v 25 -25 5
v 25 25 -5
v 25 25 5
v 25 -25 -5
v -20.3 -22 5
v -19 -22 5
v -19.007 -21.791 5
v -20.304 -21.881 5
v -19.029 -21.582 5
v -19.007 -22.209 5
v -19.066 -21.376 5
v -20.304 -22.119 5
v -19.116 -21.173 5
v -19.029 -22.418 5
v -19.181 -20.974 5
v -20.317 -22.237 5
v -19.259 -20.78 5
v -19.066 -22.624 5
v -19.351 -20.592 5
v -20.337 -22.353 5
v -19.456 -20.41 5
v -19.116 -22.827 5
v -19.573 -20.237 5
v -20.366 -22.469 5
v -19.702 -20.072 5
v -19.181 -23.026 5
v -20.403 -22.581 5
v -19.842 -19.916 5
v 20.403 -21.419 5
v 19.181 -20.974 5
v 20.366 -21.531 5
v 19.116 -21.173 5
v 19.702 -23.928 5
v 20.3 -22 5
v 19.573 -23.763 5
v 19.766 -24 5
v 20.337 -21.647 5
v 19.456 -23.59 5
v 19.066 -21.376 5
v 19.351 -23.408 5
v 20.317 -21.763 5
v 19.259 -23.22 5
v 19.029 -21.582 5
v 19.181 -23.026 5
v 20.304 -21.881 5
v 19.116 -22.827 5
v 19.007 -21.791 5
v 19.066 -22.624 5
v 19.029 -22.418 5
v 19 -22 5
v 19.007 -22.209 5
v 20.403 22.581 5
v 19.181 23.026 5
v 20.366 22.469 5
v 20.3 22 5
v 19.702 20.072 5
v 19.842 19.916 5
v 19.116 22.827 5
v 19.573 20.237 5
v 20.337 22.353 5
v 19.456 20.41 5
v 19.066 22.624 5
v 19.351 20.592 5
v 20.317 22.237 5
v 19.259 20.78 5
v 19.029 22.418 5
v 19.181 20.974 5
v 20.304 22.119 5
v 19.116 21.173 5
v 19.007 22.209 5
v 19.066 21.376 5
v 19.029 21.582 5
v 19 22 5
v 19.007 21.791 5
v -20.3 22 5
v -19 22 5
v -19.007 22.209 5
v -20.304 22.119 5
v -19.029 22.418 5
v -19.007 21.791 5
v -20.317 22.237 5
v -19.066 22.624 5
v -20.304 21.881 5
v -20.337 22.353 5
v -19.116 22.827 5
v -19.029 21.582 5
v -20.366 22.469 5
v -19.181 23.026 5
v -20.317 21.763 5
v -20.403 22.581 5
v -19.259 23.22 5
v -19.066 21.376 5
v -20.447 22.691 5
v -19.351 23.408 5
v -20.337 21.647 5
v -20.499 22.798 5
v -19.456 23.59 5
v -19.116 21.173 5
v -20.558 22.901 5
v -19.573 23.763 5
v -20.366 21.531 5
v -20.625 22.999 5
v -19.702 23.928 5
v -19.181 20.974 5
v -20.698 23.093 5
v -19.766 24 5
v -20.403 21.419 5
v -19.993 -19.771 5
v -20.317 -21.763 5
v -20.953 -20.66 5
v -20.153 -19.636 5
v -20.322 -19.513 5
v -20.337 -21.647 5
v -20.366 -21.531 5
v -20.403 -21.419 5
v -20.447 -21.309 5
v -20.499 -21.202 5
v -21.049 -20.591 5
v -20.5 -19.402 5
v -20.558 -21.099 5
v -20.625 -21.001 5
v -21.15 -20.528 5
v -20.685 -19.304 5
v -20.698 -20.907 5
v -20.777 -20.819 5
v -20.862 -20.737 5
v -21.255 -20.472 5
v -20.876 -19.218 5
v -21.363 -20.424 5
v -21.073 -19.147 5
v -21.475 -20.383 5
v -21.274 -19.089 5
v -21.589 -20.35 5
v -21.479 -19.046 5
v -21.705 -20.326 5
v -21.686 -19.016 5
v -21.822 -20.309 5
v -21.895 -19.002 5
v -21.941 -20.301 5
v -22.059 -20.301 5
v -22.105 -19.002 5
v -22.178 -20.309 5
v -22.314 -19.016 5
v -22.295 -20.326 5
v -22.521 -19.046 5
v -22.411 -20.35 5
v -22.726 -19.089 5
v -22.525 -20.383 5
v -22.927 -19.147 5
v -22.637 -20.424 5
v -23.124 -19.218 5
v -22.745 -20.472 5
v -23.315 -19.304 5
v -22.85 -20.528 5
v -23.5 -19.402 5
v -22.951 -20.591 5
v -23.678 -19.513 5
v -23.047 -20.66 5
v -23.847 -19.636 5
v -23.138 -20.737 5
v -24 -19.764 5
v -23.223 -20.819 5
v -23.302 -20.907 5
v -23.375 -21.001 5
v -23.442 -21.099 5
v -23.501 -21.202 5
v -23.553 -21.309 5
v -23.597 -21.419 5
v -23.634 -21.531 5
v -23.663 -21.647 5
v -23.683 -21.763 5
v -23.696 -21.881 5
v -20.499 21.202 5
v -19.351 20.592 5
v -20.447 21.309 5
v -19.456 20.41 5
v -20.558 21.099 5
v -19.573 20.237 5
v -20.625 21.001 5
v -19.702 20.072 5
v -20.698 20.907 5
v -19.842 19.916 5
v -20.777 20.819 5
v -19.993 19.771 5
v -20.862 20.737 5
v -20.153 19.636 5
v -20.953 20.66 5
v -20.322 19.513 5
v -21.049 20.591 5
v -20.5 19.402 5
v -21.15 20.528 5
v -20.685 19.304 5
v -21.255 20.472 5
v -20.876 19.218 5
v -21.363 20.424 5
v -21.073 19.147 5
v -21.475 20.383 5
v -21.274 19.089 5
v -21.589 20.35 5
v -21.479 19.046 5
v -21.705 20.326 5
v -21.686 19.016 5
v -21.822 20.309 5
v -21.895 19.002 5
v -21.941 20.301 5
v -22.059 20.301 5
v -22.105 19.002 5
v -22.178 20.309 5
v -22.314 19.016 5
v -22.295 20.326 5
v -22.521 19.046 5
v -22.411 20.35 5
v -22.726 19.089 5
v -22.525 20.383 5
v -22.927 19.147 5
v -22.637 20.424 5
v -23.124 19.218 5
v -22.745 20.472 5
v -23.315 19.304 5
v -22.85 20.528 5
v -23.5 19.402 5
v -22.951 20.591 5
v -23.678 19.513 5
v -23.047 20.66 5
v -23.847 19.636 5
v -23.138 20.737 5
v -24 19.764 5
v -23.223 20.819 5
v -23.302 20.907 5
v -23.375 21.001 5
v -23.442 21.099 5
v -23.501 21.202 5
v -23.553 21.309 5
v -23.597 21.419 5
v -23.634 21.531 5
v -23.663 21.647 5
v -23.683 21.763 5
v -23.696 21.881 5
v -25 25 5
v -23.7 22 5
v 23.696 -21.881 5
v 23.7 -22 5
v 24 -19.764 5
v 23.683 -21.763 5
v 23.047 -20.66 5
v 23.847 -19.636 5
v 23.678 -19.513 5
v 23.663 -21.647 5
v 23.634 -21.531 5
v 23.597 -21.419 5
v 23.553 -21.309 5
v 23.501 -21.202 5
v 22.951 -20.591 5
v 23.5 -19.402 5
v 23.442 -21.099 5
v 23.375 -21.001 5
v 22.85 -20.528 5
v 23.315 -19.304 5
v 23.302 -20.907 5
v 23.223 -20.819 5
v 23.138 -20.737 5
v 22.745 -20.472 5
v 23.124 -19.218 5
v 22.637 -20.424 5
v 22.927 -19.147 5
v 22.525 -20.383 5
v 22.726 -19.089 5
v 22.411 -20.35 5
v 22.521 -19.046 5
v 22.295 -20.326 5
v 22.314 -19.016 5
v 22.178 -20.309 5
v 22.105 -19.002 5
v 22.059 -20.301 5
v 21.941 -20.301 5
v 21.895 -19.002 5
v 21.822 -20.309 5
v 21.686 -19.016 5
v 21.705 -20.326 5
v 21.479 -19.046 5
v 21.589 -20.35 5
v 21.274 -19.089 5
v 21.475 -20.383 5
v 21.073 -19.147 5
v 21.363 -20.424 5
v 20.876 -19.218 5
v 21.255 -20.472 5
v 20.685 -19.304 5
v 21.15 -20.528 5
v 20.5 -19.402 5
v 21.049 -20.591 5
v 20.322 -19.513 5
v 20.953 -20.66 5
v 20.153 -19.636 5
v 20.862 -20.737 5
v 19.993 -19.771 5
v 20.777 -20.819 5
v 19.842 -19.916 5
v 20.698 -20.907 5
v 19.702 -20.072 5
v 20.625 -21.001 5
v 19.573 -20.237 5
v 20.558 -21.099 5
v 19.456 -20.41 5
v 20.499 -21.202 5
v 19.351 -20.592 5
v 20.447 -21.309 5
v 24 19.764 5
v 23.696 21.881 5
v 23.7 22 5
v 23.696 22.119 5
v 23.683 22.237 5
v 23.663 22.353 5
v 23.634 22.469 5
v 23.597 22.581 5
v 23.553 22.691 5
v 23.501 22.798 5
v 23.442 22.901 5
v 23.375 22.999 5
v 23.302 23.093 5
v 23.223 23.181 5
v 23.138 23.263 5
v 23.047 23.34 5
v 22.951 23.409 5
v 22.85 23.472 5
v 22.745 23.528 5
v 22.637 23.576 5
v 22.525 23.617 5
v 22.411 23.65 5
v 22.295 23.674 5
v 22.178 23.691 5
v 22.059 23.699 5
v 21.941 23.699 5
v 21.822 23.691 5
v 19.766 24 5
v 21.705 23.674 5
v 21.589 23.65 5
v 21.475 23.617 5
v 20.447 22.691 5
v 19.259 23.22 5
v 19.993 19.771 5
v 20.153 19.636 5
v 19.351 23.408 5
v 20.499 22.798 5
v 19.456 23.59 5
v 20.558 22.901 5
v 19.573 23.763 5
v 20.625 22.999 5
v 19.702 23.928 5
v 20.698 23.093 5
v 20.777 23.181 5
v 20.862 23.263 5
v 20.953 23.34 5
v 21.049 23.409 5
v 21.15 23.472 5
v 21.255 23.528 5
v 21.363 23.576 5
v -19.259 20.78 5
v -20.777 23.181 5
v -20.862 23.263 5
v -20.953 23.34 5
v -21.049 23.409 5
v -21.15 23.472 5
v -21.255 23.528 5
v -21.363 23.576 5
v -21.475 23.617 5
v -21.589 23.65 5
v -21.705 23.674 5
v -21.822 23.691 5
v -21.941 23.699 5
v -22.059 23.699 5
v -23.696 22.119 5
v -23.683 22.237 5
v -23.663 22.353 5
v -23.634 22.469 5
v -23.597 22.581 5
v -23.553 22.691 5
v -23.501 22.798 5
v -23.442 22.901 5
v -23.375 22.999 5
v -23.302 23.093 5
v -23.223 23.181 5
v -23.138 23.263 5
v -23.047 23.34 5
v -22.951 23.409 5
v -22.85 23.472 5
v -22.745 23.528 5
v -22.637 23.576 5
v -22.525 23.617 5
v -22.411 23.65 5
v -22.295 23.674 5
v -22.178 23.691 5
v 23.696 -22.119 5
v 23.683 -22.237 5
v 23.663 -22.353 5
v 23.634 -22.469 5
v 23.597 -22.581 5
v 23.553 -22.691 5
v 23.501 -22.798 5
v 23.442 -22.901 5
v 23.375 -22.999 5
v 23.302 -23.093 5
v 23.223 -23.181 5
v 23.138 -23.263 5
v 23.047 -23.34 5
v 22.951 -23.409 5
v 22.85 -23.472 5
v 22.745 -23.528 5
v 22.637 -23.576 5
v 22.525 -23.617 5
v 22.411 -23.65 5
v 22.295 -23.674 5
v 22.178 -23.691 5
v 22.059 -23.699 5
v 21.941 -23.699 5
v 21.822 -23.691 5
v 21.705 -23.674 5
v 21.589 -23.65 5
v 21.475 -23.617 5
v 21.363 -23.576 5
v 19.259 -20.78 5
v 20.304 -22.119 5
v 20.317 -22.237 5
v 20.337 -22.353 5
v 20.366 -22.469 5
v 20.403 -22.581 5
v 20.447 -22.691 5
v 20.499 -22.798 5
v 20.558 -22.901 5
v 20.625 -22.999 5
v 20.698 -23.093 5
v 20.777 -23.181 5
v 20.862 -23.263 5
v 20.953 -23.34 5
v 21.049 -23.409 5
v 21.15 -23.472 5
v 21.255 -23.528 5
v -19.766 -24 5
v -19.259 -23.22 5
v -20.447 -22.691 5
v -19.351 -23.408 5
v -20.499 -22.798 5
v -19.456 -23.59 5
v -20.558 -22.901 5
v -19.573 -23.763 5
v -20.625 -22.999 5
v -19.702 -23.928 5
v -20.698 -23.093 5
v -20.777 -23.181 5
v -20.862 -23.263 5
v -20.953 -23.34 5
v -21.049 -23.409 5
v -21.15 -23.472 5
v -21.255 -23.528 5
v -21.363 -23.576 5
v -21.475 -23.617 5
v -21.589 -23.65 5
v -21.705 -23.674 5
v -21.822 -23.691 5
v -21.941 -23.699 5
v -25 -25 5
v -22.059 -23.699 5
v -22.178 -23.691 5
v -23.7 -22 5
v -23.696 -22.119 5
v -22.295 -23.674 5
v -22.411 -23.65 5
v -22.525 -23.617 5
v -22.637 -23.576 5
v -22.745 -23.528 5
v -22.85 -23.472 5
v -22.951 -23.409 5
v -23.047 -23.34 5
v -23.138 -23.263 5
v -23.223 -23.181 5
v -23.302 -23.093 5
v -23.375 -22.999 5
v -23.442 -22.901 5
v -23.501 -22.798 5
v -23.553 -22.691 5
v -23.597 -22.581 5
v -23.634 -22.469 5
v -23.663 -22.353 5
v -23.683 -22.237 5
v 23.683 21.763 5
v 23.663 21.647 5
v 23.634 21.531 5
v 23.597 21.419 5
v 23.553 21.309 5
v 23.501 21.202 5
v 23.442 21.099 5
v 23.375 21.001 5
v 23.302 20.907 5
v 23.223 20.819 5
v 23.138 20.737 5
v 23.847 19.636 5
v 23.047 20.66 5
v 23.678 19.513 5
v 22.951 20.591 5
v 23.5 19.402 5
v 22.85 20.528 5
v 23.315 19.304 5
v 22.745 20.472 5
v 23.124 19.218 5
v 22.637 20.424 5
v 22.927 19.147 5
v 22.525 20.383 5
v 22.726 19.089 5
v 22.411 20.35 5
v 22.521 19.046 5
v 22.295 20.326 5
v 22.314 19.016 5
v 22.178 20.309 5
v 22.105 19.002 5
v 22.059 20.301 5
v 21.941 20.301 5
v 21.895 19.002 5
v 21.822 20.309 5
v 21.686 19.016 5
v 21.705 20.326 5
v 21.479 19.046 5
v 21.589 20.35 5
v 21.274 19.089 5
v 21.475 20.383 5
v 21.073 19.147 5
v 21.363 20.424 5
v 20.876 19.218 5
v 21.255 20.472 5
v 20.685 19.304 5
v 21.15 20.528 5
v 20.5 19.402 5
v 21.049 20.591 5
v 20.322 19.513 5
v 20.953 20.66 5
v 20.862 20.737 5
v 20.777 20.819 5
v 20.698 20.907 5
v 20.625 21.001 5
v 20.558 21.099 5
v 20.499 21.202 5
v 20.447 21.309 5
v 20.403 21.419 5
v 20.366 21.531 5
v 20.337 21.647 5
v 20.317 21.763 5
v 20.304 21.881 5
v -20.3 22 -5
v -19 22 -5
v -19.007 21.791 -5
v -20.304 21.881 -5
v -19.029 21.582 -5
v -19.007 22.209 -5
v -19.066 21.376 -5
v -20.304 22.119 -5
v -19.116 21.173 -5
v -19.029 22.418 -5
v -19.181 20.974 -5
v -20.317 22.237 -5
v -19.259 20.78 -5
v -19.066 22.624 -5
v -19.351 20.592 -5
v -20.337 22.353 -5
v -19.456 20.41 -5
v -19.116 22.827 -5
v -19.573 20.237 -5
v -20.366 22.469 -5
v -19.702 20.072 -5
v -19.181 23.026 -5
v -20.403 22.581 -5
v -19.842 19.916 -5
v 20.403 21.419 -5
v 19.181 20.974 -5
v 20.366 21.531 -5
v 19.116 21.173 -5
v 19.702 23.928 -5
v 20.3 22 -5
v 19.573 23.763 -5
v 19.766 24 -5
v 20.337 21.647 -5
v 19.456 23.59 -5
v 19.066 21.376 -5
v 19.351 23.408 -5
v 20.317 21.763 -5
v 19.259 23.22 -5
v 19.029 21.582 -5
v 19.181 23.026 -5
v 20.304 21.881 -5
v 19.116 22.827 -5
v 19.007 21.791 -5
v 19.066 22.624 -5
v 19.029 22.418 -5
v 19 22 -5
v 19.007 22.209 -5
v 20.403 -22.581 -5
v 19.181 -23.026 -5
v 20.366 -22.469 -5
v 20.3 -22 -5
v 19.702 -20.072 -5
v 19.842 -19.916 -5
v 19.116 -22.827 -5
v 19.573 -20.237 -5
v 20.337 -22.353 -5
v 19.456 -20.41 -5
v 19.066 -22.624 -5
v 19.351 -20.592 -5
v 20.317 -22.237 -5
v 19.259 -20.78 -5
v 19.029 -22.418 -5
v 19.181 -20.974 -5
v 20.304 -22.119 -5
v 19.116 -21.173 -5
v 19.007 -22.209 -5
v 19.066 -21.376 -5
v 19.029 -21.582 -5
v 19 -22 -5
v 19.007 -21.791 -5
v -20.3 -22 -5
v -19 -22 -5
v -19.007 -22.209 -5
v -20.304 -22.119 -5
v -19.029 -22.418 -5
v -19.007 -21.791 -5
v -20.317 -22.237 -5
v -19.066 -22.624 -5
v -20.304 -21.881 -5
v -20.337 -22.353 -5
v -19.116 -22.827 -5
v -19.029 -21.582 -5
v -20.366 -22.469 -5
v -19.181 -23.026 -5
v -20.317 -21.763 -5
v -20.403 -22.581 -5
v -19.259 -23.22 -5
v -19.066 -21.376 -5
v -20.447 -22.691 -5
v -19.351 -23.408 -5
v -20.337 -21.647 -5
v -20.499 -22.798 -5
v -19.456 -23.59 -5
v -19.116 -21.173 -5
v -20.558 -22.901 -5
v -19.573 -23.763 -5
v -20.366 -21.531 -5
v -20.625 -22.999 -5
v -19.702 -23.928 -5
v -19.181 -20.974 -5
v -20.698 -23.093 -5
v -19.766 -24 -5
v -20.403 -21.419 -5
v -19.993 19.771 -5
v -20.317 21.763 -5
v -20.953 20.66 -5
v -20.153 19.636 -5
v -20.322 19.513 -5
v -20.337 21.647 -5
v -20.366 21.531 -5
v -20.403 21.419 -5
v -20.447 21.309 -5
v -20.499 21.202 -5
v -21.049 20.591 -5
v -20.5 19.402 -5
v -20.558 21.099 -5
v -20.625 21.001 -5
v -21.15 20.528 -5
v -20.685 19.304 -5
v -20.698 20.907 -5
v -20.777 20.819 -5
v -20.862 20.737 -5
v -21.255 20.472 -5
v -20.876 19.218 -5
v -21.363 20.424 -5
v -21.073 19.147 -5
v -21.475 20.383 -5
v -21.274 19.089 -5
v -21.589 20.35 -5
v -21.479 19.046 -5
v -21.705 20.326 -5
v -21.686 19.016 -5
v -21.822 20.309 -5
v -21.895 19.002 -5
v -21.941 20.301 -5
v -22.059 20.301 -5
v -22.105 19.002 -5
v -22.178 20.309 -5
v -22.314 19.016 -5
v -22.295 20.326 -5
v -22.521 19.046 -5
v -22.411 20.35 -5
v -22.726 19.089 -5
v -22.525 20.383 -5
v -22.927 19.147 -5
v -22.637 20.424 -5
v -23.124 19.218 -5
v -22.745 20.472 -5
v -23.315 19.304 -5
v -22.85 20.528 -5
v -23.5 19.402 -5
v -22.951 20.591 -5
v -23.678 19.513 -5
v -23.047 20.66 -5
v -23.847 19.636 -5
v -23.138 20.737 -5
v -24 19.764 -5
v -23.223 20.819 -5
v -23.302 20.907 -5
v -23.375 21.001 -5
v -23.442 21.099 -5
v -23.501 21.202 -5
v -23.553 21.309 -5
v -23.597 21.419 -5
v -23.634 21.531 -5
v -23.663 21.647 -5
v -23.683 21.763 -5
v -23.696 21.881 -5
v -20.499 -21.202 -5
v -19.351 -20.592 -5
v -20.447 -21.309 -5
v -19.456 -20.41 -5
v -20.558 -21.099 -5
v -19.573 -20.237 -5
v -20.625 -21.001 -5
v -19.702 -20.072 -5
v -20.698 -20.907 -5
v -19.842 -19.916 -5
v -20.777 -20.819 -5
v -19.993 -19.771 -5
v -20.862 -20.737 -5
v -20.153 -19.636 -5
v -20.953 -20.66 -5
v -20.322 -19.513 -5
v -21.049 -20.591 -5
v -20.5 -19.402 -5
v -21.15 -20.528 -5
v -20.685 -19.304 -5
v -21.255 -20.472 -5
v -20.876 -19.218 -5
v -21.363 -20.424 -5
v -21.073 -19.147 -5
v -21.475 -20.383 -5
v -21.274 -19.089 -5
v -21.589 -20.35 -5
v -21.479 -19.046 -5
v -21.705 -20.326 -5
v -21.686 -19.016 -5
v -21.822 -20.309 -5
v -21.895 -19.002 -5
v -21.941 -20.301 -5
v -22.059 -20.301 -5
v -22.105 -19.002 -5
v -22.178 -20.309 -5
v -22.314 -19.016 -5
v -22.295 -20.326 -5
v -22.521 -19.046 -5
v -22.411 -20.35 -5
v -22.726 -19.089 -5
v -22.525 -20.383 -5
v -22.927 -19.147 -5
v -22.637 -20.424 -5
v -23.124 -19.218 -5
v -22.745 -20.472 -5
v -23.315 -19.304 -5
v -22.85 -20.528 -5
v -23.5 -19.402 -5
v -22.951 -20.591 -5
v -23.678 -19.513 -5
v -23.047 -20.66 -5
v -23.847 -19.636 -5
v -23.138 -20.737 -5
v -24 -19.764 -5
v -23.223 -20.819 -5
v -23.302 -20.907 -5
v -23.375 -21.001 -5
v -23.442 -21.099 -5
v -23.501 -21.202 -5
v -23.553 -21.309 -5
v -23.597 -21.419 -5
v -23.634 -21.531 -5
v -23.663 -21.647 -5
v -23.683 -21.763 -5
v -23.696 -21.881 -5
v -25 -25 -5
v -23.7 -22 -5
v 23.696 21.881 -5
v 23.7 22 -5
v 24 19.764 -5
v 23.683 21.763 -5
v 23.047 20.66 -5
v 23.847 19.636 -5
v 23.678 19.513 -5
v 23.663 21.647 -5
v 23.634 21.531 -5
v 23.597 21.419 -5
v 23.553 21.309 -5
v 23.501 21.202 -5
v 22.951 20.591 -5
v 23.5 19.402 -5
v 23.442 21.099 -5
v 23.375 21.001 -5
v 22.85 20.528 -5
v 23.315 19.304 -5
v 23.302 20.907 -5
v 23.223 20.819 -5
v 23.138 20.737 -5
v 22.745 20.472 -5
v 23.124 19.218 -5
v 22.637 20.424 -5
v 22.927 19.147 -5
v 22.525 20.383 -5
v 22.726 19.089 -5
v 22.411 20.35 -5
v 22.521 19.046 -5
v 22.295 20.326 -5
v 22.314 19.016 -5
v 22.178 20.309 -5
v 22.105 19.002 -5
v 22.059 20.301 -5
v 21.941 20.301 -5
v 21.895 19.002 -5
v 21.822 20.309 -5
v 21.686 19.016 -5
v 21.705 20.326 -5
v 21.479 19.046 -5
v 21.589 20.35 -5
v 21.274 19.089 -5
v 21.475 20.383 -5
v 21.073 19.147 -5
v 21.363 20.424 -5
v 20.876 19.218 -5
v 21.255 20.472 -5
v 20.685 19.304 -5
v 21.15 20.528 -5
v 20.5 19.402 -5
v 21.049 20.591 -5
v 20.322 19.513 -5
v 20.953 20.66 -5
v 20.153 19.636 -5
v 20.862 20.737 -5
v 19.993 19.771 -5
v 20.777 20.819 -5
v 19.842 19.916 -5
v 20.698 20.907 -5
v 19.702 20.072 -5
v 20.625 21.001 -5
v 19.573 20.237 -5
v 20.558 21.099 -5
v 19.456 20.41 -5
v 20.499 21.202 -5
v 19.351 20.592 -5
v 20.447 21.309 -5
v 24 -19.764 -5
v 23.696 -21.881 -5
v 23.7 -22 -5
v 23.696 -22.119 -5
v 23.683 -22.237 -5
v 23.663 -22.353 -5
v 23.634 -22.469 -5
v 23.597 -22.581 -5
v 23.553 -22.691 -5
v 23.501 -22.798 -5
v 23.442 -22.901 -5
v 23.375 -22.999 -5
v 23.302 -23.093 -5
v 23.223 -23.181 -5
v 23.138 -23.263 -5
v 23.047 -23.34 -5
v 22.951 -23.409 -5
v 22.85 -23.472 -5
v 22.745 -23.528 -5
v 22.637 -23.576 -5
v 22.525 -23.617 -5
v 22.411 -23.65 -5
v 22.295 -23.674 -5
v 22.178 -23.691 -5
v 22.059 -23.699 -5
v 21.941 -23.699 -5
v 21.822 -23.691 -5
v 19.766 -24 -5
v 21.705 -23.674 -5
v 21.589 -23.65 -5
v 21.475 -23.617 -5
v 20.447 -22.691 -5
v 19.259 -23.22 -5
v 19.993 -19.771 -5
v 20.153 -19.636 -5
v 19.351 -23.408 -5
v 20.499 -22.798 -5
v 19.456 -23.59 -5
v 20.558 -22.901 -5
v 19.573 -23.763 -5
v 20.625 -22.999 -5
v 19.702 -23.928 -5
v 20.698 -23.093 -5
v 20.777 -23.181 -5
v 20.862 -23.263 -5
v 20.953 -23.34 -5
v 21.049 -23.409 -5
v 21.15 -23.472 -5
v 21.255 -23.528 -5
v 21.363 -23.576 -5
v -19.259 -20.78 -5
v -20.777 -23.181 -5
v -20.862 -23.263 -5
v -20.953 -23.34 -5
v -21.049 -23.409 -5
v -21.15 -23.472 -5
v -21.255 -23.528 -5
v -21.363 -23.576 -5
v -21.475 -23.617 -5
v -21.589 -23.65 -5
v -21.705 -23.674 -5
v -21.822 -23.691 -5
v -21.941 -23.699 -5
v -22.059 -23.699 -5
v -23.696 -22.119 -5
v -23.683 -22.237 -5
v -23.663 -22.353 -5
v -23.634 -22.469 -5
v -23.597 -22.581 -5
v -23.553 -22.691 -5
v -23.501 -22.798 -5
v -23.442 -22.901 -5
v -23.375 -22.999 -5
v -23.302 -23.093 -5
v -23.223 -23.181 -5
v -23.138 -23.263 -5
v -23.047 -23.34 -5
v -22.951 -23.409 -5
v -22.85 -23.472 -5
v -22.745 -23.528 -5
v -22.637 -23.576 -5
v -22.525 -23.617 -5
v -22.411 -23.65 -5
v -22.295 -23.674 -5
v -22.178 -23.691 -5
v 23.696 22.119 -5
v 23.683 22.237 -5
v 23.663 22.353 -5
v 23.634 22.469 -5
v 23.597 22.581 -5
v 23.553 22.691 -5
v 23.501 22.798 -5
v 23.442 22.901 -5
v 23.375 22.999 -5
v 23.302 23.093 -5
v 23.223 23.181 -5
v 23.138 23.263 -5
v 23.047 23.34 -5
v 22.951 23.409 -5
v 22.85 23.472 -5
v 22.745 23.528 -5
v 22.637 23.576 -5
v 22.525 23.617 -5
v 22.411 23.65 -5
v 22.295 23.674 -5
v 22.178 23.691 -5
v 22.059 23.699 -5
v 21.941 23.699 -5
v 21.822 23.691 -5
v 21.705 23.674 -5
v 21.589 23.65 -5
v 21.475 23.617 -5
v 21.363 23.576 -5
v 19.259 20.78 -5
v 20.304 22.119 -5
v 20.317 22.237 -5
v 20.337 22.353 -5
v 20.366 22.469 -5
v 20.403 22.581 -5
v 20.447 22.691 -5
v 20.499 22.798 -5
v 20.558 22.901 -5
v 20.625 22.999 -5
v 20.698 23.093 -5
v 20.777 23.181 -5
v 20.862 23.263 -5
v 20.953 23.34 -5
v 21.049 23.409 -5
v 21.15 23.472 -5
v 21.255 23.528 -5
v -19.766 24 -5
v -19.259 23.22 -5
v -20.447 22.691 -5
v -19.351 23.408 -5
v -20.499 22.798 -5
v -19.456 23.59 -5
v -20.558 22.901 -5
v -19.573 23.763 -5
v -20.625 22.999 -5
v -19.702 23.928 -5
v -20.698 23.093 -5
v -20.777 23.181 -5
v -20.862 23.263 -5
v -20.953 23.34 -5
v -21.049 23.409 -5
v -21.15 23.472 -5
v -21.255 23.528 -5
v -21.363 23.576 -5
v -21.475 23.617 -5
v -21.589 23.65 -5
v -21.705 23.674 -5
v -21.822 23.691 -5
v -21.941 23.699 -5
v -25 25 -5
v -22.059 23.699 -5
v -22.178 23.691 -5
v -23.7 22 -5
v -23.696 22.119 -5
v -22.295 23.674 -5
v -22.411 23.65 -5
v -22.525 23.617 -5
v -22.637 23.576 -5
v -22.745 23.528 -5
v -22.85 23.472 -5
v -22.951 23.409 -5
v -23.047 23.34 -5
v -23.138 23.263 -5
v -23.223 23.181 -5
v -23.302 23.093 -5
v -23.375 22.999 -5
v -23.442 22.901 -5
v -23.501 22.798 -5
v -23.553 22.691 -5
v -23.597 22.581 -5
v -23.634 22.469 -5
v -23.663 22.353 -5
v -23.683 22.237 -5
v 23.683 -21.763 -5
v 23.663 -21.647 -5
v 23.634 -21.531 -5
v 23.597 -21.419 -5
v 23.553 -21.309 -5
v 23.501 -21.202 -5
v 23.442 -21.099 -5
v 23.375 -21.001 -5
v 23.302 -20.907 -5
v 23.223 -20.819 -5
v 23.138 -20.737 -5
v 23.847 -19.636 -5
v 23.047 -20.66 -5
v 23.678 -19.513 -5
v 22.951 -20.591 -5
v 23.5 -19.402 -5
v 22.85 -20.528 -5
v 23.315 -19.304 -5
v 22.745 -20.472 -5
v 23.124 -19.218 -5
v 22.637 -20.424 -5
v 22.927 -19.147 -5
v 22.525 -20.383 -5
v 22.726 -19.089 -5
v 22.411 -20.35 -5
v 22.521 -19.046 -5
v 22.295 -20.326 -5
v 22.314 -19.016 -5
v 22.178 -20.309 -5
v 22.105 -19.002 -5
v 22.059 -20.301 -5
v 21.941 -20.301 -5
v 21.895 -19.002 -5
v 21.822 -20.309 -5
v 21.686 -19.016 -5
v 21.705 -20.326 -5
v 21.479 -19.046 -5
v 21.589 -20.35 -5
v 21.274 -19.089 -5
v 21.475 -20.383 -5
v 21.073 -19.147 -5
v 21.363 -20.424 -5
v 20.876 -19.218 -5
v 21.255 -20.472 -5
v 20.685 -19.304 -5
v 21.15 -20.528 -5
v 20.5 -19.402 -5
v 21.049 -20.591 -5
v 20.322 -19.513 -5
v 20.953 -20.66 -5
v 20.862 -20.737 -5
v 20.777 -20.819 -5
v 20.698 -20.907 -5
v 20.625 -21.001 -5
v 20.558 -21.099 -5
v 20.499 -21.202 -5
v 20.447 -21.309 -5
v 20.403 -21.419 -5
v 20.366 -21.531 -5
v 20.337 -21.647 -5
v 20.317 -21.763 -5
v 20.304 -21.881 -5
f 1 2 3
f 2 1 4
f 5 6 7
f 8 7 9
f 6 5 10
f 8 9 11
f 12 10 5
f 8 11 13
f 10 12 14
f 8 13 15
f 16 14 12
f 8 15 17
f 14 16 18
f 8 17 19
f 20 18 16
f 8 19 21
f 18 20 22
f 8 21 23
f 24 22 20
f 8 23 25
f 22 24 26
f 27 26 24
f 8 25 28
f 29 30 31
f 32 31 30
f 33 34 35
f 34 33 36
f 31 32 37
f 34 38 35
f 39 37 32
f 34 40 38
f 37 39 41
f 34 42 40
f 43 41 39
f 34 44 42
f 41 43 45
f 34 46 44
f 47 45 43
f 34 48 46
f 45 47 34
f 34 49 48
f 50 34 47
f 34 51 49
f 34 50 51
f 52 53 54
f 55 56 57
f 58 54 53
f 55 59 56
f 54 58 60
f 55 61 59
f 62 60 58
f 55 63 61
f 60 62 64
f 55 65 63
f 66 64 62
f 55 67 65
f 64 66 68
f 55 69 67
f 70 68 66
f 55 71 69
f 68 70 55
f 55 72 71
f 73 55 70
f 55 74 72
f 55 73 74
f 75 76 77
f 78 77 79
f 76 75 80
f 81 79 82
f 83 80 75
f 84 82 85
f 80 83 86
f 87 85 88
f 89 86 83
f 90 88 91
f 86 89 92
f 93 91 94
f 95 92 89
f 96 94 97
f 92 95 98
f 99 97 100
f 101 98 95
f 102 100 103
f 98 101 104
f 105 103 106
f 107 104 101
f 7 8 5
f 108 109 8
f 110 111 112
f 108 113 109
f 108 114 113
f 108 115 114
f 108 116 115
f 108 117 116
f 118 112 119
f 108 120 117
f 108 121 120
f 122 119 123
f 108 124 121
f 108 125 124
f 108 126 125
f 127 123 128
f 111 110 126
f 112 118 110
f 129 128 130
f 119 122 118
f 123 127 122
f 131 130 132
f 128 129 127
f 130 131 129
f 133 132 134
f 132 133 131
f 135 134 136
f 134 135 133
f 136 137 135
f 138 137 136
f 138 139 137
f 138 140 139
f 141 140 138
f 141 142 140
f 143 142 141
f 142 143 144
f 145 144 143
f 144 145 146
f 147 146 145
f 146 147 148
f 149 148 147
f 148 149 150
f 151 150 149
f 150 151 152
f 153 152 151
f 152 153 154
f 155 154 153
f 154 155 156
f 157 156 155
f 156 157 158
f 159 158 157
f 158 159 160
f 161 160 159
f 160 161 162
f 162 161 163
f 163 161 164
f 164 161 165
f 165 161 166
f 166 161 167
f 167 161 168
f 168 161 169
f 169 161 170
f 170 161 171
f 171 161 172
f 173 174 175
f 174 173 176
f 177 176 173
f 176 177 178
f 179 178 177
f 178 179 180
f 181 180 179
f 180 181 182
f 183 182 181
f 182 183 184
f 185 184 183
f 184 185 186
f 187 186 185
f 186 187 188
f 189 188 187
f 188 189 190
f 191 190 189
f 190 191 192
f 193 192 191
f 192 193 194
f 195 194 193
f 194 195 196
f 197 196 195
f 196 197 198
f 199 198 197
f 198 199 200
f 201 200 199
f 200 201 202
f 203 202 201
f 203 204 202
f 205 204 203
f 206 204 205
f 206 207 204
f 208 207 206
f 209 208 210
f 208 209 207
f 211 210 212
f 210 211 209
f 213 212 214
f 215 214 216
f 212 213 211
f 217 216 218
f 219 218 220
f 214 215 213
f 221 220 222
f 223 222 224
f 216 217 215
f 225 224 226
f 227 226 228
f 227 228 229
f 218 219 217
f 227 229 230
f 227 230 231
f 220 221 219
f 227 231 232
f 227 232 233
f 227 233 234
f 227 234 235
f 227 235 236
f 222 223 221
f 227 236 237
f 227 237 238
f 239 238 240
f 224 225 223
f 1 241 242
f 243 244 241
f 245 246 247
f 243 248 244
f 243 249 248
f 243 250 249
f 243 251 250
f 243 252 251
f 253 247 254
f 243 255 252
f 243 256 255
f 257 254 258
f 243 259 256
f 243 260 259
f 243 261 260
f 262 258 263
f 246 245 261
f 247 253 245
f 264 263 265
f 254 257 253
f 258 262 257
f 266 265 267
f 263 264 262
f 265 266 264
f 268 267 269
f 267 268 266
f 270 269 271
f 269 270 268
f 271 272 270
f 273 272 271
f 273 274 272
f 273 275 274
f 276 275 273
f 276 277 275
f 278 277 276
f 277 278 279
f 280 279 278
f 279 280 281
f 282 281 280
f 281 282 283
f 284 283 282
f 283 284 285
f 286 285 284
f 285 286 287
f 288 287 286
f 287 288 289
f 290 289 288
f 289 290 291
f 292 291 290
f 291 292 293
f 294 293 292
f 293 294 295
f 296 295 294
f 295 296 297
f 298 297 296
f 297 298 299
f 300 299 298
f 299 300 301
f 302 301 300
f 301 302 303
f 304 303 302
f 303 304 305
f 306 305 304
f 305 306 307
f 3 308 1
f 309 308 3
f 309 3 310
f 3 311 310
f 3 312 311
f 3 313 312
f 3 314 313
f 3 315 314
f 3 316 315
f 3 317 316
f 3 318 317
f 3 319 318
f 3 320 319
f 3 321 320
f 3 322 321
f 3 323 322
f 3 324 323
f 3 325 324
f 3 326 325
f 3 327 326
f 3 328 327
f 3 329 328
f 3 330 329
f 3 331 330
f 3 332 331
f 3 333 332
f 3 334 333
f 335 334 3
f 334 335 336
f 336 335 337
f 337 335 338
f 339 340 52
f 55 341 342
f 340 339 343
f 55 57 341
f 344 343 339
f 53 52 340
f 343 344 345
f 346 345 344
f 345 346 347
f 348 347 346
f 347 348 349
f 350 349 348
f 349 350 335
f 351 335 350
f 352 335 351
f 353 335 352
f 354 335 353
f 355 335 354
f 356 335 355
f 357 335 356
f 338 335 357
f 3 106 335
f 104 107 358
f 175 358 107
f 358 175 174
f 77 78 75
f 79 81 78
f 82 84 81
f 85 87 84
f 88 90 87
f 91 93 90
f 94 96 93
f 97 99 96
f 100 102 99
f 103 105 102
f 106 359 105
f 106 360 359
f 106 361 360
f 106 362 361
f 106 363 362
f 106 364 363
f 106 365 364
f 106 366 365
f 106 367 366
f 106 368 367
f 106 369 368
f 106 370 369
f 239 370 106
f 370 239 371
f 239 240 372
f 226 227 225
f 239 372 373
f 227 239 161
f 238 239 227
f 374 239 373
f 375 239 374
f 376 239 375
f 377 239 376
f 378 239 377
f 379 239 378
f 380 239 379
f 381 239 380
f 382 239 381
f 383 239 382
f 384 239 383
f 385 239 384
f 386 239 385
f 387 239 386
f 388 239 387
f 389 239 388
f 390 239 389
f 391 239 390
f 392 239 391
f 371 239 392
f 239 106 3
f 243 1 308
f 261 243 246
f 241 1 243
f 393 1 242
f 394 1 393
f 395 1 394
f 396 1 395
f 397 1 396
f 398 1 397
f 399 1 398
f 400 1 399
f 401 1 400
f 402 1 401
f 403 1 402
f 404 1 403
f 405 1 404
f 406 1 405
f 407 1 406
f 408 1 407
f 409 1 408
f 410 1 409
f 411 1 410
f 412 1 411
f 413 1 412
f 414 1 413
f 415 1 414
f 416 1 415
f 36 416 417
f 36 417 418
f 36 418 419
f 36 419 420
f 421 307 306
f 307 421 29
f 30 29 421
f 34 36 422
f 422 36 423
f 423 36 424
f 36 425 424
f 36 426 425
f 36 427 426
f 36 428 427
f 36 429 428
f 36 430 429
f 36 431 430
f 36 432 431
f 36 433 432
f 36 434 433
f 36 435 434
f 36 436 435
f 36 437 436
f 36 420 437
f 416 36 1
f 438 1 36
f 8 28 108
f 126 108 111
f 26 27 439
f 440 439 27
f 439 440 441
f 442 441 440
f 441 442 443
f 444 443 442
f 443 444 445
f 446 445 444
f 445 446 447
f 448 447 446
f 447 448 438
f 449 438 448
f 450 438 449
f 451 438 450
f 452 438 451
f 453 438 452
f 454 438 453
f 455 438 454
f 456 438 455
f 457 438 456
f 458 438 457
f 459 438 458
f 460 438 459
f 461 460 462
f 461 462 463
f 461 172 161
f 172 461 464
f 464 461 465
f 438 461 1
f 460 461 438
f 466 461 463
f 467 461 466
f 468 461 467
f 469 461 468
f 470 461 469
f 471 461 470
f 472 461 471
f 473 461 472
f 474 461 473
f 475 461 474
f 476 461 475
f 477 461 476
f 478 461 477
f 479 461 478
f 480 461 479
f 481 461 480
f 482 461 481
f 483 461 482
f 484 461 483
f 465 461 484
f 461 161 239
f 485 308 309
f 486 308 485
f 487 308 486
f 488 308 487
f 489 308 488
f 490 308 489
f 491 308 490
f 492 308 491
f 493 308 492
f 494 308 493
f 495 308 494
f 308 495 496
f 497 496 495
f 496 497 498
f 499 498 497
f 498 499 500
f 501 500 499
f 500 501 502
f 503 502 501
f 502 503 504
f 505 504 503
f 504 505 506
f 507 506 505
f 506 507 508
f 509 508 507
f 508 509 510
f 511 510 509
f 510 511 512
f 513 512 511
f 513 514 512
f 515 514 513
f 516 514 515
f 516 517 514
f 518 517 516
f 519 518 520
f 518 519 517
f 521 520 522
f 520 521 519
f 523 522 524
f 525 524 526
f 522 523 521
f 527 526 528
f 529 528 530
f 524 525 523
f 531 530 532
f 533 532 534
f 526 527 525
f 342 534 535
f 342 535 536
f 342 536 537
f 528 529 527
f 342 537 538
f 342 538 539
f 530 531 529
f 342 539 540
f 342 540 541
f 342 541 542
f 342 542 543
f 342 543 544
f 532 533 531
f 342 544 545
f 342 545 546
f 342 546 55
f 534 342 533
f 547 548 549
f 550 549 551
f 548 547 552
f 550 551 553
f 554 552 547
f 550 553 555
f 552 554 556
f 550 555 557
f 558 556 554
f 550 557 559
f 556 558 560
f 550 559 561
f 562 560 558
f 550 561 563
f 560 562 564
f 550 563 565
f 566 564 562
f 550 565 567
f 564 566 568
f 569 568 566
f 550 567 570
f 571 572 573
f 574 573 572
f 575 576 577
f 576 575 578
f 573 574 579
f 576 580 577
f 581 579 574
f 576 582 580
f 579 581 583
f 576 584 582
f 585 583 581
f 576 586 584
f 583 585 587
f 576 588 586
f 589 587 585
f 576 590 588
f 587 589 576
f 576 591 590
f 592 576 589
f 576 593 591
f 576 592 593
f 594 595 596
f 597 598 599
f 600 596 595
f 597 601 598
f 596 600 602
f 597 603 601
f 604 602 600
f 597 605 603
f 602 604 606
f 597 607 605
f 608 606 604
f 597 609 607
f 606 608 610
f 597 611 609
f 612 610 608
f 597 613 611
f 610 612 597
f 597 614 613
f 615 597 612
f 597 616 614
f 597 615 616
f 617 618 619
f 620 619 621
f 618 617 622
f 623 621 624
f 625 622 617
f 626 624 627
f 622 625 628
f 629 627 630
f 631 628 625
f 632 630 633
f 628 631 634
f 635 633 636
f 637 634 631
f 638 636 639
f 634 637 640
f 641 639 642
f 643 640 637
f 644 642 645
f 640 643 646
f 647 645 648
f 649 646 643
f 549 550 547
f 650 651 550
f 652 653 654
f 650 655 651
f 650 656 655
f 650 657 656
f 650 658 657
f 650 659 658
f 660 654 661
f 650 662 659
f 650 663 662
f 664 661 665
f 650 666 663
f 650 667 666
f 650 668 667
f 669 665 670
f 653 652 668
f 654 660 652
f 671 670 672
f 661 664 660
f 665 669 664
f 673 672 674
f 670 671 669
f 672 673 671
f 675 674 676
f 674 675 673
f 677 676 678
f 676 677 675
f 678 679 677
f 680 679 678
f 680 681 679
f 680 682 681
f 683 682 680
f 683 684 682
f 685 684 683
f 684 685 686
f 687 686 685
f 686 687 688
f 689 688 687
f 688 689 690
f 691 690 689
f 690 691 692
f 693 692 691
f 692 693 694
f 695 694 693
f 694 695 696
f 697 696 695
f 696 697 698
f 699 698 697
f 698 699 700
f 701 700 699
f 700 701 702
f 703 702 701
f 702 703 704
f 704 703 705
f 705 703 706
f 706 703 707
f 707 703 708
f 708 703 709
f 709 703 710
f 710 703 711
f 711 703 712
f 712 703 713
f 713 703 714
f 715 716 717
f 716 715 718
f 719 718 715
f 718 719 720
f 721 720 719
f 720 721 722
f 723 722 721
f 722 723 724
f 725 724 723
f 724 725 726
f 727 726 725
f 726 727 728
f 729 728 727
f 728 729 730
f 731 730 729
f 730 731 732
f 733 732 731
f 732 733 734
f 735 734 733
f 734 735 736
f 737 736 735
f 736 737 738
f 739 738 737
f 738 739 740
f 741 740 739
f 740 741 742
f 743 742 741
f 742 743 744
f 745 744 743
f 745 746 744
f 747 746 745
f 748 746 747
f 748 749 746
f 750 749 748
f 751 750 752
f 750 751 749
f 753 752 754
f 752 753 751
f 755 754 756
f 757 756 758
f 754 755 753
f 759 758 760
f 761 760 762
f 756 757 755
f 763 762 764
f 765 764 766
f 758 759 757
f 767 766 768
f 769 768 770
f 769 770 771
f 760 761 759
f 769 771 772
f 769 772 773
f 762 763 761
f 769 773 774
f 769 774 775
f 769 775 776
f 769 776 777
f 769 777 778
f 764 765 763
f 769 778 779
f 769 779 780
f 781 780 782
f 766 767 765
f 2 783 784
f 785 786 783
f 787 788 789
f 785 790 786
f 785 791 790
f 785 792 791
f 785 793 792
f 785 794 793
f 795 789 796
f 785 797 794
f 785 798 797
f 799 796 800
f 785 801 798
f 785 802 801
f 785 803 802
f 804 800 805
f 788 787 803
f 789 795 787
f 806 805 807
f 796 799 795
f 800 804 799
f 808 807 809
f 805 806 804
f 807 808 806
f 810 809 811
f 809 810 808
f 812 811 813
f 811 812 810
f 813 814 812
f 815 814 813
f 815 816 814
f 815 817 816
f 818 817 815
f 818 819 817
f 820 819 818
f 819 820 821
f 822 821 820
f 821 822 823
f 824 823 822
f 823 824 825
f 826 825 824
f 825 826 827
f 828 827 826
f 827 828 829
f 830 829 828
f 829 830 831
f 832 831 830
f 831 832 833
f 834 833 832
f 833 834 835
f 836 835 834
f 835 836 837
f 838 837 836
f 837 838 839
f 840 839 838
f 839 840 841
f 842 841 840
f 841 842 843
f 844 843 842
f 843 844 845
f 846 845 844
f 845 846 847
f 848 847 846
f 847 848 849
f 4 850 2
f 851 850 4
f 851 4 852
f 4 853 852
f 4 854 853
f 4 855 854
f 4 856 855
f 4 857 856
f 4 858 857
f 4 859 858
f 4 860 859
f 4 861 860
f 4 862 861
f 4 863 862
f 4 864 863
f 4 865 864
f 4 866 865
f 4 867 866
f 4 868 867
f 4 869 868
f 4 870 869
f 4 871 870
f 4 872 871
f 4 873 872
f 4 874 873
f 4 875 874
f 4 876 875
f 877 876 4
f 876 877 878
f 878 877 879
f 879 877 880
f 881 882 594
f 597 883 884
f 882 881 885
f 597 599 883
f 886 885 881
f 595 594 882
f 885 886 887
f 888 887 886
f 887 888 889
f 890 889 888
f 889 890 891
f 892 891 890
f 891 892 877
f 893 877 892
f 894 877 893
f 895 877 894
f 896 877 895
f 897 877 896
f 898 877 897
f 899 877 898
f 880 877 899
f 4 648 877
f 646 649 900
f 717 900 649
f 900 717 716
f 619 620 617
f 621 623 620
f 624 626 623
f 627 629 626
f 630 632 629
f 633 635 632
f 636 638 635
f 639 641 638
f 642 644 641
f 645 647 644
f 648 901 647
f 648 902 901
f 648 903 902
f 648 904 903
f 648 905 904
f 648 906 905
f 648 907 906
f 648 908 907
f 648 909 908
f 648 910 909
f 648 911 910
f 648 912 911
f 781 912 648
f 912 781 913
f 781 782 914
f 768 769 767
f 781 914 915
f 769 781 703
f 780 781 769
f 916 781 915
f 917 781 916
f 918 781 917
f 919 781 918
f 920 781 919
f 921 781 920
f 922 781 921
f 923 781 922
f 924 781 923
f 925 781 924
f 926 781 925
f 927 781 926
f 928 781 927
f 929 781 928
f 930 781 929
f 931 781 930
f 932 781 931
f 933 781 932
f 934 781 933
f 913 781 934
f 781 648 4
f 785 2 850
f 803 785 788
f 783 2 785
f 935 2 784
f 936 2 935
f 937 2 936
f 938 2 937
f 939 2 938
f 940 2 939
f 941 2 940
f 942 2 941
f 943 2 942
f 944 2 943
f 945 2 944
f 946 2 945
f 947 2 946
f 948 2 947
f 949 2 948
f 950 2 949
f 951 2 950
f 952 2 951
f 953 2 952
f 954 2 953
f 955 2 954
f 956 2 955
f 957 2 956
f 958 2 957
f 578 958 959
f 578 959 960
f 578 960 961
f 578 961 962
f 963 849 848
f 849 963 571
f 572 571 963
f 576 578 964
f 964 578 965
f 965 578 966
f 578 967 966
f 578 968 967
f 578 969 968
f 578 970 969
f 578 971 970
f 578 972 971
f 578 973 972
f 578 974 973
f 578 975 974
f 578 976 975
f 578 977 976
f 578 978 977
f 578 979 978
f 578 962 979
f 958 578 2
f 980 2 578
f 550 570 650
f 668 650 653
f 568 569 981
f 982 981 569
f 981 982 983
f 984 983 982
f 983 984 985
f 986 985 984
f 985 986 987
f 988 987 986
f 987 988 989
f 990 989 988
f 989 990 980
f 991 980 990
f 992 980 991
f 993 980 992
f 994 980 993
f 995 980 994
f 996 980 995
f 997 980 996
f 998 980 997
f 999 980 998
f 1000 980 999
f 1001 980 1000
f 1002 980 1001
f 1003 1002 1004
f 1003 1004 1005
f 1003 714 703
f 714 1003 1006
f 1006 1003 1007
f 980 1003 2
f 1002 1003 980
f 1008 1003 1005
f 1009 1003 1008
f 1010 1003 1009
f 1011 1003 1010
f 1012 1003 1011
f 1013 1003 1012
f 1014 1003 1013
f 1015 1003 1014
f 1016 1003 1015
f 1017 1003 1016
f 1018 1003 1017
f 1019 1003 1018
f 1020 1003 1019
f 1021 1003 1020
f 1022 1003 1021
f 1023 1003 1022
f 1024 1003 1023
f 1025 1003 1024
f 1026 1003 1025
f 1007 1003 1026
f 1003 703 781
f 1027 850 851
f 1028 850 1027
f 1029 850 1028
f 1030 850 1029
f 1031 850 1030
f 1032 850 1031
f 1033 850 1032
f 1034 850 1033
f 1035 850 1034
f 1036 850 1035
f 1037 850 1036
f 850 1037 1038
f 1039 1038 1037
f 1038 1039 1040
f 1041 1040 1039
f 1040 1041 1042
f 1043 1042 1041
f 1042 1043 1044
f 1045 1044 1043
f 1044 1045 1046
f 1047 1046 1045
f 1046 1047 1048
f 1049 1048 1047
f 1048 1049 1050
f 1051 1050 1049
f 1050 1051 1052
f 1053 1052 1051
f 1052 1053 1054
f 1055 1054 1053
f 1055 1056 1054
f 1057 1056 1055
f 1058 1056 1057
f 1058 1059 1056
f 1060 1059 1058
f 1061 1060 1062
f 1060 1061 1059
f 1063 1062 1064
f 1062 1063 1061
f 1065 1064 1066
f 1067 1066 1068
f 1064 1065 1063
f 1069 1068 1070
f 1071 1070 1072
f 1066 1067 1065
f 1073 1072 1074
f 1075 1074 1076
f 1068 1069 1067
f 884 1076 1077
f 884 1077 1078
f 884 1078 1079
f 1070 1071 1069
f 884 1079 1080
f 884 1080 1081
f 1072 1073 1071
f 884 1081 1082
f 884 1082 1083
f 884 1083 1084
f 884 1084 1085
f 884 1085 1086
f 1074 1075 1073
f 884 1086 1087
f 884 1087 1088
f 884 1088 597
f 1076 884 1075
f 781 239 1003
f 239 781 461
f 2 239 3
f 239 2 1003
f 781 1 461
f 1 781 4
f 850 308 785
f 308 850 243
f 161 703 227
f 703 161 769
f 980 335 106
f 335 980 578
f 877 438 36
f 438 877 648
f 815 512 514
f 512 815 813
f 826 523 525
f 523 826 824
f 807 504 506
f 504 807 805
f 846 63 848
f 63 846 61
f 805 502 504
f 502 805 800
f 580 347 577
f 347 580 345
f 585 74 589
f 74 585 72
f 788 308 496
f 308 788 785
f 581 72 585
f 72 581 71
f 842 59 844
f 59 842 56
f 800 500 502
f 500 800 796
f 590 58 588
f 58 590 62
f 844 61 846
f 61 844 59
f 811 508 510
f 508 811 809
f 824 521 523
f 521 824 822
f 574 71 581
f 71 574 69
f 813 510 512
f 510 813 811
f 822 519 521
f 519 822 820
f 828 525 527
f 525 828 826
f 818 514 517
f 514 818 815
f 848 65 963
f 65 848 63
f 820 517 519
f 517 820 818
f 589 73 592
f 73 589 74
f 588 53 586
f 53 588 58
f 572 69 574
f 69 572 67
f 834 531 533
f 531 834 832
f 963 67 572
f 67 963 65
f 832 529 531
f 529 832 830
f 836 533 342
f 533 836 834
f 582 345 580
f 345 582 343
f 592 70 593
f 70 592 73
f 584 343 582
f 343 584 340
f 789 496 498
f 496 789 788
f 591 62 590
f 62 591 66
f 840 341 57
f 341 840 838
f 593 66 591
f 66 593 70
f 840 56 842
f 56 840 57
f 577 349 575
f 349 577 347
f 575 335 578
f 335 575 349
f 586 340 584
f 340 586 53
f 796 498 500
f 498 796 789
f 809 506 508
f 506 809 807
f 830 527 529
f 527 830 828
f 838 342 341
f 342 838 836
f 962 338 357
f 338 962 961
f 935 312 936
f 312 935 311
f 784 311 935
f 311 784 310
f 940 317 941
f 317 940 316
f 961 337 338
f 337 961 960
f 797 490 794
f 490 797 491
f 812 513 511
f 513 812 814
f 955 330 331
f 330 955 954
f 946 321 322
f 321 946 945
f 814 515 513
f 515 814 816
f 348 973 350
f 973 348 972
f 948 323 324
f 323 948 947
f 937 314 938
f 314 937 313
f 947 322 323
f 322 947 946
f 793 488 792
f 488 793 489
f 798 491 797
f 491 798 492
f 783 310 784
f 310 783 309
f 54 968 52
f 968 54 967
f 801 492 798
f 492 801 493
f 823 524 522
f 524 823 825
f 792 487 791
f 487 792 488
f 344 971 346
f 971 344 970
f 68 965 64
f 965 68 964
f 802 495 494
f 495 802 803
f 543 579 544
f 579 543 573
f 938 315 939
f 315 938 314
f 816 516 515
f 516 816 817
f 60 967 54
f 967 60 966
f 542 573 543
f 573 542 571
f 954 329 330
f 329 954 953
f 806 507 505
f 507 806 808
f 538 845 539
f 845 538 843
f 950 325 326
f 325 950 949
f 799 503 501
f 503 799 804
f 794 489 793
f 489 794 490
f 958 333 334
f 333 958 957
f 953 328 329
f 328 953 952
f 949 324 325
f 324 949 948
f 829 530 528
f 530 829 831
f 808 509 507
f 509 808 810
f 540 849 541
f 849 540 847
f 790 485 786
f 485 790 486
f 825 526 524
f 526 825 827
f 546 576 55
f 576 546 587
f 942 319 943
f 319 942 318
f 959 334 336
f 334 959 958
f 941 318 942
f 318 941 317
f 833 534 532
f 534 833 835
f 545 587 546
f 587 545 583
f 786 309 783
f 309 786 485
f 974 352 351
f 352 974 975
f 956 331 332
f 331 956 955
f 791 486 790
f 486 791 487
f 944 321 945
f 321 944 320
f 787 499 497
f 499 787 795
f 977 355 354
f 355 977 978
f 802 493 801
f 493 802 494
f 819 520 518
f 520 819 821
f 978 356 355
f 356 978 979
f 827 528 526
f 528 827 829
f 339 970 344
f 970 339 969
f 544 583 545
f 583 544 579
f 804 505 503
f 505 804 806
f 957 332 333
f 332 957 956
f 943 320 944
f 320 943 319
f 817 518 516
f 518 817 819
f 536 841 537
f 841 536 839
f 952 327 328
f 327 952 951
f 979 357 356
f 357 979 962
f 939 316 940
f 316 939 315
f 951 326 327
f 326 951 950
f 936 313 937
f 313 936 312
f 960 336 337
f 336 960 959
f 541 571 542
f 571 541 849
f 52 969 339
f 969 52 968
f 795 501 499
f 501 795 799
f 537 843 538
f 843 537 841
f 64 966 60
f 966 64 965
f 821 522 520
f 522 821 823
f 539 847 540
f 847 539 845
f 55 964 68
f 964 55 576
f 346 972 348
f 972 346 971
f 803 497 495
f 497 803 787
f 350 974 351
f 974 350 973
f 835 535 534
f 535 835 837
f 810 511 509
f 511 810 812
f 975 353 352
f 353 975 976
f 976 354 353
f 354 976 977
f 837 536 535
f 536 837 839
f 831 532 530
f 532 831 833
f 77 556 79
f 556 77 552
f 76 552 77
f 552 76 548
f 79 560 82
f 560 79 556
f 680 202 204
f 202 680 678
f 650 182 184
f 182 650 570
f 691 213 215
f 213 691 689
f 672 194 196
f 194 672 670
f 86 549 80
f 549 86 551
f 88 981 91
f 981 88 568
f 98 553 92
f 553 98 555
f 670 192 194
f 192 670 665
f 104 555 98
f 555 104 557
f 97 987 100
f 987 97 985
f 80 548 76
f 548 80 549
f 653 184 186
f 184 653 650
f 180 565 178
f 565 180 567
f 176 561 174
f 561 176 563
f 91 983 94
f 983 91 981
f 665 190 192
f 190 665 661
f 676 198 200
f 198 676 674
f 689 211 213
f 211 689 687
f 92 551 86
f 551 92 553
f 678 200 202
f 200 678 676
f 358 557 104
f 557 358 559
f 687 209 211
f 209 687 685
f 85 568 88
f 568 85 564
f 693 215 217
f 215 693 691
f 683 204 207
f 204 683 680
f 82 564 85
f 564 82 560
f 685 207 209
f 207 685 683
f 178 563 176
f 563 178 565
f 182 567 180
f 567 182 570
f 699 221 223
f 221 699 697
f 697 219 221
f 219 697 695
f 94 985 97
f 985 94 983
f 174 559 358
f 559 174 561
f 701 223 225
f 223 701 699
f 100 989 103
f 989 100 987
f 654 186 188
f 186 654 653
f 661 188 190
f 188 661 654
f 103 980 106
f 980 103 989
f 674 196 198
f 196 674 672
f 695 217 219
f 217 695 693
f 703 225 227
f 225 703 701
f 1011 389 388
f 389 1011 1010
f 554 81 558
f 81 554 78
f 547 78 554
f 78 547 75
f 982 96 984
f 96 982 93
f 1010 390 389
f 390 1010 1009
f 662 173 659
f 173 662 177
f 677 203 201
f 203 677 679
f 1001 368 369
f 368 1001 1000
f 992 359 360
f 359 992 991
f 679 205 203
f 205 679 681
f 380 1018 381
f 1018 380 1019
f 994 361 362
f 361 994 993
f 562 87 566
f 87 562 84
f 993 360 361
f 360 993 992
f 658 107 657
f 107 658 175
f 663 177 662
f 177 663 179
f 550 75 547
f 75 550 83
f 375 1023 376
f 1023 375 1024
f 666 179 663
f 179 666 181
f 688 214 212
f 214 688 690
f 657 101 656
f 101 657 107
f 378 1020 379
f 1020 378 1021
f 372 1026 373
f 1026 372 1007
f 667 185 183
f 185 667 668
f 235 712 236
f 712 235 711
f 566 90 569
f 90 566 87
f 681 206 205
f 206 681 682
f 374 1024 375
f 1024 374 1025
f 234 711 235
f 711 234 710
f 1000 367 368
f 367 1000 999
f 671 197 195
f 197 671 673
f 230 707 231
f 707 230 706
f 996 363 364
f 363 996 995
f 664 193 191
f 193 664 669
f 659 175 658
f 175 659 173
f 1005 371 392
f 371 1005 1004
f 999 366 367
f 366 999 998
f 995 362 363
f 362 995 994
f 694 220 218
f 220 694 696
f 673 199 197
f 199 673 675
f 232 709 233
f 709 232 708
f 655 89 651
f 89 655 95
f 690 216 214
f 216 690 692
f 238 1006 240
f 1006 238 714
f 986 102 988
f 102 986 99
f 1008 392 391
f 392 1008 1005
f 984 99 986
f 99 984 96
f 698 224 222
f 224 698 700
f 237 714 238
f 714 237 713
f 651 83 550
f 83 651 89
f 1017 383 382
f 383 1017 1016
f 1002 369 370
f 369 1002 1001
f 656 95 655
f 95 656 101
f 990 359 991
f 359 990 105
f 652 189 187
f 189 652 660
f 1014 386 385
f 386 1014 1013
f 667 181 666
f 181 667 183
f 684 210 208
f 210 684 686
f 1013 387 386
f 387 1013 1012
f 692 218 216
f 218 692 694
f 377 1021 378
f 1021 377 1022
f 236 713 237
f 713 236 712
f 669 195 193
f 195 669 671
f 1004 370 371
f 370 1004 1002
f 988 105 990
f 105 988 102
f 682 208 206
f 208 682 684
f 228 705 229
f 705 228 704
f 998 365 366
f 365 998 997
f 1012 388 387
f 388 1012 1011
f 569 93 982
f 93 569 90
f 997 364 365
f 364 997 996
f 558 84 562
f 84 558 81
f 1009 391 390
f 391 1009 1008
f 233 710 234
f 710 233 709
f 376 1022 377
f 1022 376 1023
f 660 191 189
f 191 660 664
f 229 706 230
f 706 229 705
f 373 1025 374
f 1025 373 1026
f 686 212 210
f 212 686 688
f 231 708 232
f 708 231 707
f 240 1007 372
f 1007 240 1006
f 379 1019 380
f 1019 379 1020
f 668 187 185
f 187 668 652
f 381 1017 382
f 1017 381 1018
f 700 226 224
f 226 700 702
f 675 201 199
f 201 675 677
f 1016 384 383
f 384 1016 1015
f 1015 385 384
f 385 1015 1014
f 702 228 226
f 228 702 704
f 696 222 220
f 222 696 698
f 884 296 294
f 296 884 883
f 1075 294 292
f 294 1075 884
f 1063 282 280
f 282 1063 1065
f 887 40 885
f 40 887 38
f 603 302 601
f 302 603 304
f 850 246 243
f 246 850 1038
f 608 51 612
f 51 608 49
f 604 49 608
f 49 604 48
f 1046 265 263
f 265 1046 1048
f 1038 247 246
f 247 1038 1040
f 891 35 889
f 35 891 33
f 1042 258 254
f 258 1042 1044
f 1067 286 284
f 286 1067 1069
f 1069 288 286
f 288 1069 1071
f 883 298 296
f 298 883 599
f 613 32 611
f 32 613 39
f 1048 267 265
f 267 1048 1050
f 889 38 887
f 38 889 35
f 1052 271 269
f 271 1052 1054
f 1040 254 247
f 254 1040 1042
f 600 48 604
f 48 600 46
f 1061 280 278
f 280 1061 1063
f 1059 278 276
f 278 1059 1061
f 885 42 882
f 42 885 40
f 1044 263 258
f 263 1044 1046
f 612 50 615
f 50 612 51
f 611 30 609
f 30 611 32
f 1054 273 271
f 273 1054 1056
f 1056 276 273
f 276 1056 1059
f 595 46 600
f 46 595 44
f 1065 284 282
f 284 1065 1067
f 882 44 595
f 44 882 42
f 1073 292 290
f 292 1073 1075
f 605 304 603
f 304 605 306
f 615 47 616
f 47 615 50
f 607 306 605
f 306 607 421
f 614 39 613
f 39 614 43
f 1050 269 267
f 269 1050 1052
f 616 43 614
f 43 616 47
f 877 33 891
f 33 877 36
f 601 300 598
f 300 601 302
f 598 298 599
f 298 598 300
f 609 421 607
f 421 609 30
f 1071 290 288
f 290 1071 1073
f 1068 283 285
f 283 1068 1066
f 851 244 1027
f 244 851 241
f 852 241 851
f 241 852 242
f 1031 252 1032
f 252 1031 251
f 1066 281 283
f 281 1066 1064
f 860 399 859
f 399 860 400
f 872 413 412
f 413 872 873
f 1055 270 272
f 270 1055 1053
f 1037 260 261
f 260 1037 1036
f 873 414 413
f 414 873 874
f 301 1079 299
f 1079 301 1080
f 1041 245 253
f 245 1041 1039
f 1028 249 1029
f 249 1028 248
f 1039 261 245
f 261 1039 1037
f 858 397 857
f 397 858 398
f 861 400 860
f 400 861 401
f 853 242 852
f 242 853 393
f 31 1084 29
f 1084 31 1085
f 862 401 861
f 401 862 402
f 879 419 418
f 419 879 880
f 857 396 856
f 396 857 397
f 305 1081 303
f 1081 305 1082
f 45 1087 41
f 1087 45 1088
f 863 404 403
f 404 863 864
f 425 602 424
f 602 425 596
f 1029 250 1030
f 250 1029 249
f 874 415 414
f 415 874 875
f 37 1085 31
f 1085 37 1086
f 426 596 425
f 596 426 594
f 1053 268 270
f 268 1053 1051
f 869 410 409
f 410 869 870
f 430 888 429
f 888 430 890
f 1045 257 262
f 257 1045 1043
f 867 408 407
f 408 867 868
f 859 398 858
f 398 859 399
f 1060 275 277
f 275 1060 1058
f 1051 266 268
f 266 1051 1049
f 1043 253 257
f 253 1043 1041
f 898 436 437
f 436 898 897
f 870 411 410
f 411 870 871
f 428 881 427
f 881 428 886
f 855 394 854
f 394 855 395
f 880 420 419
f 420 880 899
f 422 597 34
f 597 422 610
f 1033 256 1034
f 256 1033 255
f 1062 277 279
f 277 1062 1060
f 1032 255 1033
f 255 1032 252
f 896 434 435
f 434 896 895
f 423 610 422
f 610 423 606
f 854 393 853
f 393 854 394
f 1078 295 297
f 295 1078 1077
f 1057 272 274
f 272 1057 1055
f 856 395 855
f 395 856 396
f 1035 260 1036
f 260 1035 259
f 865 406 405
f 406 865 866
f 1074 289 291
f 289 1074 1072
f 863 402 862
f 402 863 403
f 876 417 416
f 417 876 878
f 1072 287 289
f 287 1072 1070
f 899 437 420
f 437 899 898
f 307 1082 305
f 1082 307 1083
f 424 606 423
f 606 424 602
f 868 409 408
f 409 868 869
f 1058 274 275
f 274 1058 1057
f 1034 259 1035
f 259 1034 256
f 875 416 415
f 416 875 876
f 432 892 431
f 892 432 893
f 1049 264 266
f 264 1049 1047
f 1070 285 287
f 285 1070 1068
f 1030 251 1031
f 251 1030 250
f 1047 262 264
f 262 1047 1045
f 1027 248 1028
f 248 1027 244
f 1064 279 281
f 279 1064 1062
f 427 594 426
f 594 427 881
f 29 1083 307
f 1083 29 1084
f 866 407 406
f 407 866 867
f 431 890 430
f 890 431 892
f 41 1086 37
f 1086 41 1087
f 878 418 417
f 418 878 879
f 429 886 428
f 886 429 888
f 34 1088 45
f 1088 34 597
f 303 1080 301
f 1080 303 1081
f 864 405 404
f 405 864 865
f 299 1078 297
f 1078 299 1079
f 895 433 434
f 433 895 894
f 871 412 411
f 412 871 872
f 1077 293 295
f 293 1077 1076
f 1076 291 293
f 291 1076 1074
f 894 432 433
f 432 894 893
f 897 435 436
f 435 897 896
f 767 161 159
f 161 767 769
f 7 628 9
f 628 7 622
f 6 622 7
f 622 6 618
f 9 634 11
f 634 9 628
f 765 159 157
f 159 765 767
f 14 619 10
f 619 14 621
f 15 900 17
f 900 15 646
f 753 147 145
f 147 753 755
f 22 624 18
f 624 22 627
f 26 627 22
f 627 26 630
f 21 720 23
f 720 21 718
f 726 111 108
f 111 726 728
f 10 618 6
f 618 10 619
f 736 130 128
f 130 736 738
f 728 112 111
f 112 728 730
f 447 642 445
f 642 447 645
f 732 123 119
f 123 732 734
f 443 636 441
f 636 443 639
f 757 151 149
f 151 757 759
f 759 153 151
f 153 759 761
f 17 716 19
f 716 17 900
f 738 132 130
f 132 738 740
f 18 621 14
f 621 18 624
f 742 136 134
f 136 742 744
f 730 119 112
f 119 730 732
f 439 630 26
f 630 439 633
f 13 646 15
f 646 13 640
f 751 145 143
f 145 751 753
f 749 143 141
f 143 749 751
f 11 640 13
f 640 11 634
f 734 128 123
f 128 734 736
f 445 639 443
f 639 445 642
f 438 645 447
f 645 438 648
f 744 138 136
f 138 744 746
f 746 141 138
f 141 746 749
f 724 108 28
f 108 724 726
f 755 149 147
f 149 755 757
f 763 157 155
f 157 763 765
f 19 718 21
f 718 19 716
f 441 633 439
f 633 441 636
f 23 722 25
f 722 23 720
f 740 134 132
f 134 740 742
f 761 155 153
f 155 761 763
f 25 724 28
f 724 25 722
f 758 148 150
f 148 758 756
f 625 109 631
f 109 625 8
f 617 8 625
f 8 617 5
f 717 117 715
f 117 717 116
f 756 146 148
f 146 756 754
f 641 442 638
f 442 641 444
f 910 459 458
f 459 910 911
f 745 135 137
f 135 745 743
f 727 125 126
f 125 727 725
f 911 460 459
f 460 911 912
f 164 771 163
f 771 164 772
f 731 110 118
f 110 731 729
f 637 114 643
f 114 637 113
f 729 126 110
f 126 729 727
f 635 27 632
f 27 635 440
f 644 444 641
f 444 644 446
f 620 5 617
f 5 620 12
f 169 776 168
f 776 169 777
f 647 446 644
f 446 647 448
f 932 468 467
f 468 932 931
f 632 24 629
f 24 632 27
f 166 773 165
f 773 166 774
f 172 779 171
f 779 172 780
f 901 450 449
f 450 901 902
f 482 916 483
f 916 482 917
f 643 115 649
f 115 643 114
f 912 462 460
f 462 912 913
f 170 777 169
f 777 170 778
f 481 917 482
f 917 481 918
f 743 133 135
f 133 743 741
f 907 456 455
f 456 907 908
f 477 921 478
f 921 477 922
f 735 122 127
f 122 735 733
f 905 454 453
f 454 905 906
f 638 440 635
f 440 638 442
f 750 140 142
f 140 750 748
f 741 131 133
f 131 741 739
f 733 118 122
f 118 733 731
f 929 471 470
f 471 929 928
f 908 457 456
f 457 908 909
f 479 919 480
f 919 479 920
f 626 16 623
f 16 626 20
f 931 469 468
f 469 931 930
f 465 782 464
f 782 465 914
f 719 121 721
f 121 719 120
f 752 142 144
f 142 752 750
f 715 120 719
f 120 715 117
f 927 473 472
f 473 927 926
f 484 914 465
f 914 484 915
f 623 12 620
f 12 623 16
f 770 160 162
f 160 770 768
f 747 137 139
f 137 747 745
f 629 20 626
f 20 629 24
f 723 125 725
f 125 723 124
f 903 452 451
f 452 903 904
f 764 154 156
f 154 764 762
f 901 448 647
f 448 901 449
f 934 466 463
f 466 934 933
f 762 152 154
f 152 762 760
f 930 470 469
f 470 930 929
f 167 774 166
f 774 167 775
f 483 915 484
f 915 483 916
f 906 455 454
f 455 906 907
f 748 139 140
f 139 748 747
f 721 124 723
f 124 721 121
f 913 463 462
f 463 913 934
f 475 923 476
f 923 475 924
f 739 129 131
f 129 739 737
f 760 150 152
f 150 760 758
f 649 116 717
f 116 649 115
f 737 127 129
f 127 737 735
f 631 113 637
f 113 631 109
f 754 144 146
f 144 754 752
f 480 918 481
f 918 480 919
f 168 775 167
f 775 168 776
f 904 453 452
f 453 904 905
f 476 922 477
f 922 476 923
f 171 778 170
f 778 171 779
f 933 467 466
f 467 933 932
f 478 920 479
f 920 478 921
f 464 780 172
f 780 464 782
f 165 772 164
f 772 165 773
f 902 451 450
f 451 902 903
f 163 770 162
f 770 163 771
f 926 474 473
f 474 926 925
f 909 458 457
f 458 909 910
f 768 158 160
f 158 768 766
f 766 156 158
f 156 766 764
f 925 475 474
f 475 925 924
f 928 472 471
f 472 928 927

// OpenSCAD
$fn=90;

module case(){
    difference(){
        cube([50,50,10],center=true);
        cube([48,48,10.1],center=true);
    }
}
module screw_hole(){
    difference(){
        cylinder(h=10,d=6,center=true);
        cylinder(h=10.1,d=3.4,center=true);
    }
}
module build(){
    case();
    translate([22,22,0]) screw_hole();
    translate([-22,22,0]) screw_hole();
    translate([22,-22,0]) screw_hole();
    translate([-22,-22,0]) screw_hole();
}

build();
